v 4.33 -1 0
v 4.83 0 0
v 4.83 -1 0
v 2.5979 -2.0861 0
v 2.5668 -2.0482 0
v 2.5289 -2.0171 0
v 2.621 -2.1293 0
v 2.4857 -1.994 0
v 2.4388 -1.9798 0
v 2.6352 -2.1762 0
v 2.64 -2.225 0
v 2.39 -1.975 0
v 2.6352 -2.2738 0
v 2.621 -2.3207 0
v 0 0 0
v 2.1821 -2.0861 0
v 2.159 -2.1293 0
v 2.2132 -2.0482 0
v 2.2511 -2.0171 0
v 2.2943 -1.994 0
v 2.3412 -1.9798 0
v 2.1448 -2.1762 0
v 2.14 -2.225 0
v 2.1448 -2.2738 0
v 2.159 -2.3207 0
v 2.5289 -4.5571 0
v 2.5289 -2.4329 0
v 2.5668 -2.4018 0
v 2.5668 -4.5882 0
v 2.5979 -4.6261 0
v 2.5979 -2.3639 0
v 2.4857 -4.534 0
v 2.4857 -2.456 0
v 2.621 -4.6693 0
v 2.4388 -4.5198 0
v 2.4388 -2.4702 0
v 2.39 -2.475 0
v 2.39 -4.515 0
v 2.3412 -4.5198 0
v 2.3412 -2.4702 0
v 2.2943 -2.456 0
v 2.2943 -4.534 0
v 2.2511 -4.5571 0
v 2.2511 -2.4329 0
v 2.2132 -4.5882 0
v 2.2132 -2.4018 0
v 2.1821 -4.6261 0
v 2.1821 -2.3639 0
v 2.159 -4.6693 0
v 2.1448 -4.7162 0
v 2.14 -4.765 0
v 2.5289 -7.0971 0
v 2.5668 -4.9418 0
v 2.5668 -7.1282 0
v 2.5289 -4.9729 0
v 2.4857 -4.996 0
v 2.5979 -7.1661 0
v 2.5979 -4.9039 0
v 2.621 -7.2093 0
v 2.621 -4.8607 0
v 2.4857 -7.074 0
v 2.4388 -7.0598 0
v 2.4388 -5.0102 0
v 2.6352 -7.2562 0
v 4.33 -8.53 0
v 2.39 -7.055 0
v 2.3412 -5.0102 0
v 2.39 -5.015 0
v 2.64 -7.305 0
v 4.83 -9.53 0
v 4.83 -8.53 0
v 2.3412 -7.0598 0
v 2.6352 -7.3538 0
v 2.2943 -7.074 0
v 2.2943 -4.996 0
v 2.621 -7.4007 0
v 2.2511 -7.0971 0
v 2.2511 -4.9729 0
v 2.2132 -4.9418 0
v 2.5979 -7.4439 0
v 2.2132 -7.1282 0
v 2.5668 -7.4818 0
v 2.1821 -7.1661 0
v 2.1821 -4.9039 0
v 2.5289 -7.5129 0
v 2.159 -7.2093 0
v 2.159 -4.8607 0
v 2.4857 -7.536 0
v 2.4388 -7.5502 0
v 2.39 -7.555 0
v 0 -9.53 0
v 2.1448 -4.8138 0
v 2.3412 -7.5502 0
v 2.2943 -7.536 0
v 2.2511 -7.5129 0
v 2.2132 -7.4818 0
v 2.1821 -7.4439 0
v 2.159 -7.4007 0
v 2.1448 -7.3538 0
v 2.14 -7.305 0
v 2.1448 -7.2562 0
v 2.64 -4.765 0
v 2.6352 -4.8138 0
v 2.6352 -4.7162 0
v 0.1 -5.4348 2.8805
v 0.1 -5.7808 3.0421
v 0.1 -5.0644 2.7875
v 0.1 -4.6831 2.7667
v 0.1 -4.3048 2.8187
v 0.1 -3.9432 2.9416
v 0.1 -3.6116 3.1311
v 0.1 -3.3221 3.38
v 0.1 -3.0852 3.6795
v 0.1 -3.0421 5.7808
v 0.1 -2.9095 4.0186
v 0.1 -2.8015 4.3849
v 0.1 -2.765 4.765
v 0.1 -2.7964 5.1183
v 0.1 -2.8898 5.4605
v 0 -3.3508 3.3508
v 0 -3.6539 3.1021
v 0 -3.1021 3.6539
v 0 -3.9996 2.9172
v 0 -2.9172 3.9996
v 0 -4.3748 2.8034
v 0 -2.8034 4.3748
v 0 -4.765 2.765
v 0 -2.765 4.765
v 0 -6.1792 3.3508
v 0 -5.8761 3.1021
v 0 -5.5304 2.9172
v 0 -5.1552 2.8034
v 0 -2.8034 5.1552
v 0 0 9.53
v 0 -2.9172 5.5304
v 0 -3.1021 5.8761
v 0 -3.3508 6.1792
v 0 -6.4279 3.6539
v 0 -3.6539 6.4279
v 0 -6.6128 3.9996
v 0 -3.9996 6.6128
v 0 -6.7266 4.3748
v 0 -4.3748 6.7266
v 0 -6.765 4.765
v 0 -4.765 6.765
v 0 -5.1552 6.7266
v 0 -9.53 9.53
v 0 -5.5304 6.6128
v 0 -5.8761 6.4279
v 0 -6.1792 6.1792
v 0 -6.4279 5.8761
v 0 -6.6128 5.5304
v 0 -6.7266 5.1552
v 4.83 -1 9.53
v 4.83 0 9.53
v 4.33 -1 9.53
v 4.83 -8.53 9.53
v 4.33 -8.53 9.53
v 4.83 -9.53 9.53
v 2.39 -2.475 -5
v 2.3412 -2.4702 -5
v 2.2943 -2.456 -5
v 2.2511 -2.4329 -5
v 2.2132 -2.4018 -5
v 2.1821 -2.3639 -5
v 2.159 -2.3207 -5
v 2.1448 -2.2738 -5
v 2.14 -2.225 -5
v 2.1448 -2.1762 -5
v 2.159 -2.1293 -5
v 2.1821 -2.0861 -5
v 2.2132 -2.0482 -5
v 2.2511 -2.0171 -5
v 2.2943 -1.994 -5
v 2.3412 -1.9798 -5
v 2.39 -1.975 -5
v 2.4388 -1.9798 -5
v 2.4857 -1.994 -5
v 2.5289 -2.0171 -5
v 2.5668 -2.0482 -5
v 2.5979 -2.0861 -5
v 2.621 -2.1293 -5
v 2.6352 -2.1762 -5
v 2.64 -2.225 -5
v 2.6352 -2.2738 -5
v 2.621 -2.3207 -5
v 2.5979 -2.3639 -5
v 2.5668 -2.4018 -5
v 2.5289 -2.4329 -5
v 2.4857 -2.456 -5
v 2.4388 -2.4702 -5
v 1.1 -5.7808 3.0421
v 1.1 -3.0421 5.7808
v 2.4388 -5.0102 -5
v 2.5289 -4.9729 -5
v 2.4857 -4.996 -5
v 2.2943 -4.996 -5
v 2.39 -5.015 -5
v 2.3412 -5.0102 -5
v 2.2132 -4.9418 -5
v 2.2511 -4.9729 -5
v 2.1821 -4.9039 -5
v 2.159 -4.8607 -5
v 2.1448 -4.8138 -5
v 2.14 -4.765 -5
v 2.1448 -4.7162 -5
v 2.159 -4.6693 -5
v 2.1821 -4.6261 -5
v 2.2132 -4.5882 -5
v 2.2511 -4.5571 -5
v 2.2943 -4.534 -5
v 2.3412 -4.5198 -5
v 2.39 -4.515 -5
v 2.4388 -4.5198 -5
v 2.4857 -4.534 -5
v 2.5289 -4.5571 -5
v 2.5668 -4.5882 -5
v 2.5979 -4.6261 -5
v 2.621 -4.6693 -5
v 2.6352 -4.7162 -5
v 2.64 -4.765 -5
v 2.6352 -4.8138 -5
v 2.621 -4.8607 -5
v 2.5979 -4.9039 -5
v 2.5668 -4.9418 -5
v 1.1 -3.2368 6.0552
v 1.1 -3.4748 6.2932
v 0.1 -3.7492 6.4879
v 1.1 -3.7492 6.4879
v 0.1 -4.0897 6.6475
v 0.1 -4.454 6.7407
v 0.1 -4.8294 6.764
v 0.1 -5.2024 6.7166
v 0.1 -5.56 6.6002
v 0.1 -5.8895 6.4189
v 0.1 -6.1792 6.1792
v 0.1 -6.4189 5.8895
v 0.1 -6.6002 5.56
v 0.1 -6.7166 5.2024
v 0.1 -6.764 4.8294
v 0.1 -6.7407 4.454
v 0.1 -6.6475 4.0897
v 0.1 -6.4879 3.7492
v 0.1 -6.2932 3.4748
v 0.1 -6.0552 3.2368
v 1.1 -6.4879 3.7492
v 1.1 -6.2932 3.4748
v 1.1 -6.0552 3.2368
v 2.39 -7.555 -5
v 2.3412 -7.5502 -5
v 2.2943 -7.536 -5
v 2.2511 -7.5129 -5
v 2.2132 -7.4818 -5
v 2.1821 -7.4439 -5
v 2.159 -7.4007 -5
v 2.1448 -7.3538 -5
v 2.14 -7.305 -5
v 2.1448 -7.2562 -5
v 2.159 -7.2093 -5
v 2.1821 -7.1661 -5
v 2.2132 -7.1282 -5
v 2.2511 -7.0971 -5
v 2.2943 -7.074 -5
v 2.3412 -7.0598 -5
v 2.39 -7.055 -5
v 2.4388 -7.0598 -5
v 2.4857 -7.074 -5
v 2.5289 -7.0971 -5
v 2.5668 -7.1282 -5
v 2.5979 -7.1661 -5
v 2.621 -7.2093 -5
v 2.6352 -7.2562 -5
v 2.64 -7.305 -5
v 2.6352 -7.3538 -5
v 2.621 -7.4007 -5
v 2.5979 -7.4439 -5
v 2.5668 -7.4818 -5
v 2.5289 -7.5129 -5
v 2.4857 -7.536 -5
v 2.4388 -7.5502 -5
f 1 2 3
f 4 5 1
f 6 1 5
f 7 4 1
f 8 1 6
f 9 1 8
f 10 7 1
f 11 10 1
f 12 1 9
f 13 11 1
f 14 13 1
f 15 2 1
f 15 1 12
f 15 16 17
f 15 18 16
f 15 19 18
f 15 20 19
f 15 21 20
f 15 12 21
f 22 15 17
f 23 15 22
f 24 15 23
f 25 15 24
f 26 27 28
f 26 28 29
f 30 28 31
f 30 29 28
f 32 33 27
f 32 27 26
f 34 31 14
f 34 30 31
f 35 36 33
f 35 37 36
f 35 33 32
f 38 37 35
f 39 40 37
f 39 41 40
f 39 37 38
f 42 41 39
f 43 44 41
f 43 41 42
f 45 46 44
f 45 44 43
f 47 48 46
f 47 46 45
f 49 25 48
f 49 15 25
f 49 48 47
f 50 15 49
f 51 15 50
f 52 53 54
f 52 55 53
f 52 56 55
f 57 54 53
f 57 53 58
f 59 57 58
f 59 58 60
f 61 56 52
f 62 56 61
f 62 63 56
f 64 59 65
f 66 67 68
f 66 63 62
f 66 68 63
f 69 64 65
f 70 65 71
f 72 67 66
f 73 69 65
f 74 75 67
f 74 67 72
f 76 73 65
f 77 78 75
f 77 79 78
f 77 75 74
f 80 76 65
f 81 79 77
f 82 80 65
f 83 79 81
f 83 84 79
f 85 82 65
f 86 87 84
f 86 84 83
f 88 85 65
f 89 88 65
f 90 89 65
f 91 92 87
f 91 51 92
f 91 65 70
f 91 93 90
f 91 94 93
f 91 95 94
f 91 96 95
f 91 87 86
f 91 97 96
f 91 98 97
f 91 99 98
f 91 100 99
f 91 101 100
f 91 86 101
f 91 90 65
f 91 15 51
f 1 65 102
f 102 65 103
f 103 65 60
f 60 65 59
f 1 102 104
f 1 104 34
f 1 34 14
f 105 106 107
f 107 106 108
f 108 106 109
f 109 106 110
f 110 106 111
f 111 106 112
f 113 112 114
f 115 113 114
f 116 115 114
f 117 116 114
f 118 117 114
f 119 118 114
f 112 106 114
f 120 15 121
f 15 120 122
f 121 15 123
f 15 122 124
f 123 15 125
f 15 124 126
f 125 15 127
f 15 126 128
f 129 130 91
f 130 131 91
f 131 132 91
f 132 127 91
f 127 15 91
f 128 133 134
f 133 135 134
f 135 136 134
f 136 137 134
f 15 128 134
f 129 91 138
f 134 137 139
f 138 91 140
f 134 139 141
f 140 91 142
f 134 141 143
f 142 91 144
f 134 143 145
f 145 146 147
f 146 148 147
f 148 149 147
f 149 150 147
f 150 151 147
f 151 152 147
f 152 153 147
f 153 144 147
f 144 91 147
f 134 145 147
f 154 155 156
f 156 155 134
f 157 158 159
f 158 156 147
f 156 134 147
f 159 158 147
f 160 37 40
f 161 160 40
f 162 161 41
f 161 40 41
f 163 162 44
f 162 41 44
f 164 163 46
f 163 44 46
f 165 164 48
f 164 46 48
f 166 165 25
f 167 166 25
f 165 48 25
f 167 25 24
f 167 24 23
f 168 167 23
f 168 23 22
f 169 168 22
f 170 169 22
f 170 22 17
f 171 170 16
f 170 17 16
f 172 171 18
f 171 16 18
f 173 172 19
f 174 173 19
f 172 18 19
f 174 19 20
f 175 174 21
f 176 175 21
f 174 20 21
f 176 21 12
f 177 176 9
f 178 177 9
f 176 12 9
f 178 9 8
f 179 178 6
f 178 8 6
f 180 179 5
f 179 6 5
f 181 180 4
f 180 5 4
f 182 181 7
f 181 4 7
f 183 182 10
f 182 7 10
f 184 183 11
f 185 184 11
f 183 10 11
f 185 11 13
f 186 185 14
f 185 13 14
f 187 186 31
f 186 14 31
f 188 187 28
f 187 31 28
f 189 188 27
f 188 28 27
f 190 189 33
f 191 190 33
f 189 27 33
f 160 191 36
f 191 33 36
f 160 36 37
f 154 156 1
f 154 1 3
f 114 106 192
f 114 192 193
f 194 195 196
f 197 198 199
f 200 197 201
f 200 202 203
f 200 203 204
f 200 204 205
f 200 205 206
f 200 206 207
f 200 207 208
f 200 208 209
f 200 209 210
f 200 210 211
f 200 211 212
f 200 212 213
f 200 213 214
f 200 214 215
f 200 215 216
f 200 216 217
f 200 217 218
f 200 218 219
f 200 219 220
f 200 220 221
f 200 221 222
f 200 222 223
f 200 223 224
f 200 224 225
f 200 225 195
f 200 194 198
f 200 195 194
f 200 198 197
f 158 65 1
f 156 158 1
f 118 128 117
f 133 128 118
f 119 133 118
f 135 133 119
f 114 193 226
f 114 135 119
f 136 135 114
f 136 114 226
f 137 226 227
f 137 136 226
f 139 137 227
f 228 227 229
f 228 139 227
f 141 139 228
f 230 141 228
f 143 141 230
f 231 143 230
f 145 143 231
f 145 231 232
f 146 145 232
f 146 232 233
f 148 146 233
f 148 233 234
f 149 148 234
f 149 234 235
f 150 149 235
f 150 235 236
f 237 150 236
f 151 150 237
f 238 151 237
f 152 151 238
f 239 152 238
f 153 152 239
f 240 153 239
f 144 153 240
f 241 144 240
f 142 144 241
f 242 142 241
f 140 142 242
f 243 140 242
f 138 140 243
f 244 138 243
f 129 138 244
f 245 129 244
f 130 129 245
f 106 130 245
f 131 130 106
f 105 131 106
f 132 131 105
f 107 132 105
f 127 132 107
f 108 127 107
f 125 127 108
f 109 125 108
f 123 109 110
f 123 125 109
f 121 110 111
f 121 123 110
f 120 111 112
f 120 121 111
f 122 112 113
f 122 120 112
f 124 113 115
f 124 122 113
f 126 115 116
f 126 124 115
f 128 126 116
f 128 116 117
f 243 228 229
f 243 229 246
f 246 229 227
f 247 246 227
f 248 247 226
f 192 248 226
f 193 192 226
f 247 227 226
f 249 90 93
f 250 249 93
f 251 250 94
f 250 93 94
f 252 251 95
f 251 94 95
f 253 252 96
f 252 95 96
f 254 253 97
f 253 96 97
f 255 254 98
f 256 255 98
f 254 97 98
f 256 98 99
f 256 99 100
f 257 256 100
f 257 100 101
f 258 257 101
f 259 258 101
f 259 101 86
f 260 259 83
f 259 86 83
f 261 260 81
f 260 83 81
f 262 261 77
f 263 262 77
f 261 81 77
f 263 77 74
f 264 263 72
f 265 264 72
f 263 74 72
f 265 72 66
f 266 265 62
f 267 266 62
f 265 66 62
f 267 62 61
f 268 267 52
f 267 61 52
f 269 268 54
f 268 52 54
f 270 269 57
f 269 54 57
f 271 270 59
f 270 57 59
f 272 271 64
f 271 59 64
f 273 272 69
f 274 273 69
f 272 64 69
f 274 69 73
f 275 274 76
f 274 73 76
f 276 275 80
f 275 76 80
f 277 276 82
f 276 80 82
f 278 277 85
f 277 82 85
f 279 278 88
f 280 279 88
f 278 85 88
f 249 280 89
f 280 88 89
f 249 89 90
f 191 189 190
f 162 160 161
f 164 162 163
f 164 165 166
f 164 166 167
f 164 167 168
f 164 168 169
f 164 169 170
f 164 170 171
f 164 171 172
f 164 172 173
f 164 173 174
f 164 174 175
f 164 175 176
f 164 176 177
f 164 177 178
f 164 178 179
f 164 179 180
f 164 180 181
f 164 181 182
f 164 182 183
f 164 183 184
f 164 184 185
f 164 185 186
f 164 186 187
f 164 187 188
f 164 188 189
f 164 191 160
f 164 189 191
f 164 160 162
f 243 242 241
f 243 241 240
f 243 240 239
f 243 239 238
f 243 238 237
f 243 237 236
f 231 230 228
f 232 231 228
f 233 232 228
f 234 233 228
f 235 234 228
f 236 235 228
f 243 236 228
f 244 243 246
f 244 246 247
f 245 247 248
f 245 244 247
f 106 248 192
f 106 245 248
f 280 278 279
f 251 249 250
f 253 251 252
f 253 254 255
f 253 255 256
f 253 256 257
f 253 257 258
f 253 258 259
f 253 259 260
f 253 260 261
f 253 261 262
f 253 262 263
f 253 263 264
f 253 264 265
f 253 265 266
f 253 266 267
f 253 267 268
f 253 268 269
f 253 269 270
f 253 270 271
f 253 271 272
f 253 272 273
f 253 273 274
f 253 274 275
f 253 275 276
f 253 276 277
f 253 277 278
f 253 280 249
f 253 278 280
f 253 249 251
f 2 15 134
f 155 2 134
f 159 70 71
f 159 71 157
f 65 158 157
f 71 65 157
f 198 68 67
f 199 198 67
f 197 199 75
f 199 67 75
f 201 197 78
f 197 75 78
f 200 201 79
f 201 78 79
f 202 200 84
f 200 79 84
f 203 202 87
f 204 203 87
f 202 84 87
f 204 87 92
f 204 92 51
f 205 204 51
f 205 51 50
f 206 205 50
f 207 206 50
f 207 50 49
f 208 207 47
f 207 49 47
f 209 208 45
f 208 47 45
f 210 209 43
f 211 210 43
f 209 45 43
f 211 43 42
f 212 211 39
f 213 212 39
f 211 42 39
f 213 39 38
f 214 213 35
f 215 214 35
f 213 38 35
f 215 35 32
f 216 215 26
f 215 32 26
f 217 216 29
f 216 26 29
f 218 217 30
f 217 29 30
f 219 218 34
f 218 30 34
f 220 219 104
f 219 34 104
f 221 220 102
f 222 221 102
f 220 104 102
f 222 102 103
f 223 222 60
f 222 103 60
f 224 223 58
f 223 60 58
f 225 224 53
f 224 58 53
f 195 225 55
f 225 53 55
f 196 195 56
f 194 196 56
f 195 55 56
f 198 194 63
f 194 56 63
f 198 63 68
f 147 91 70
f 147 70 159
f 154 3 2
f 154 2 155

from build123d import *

# Parameters (mm, degrees)
SKETCH1_W           = 9.53
SKETCH1_H           = 9.53
BASIC_SHAPE_DEPTH   = 4.83
SKETCH3_R           = 2
ADJUSTER_DEPTH      = 0.1
ADJUSTER_SLOT_DEPTH = 1
SKETCH5_R           = 0.25
PINS_DEPTH          = 5
SKETCH6_W           = 0.5
SKETCH6_H           = 7.53
REAR_RELIEF_DEPTH   = 15.53


with BuildPart() as part:
    # Sketch1 → Basic Shape (new body)
    with BuildSketch(Plane(origin=(0, 0, 0), x_dir=(0, 0, 1), z_dir=(1, 0, 0))):
        with Locations((4.765, 4.765)):
            Rectangle(SKETCH1_W, SKETCH1_H)
    extrude(amount=BASIC_SHAPE_DEPTH)

    # Sketch3 → Adjuster (cut)
    with BuildSketch(Plane.YZ):
        with Locations((-4.765, 4.765)):
            Circle(SKETCH3_R)
    extrude(amount=ADJUSTER_DEPTH, mode=Mode.SUBTRACT)

    # Sketch4 → Adjuster Slot (cut)
    with BuildSketch(Plane(origin=(0.1, 0, 0), x_dir=(0, -1, 0), z_dir=(-1, 0, 0))):
        with BuildLine():
            Line((3.749246997, 6.487859784), (6.487859784, 3.749246997))
            ThreePointArc((6.487859784, 3.749246997), (6.179213562, 3.350786438), (5.780753003, 3.042140216))
            Line((5.780753003, 3.042140216), (3.042140216, 5.780753003))
            ThreePointArc((3.042140216, 5.780753003), (3.350786438, 6.179213562), (3.749246997, 6.487859784))
        make_face()
    extrude(amount=-ADJUSTER_SLOT_DEPTH, mode=Mode.SUBTRACT)

    # Sketch5 → Pins (add)
    with BuildSketch(Plane(origin=(0, -19.06, 0), x_dir=(0, -1, 0), z_dir=(0, 0, -1))):
        with Locations((-16.835, -2.39)):
            Circle(SKETCH5_R)
        with Locations((-14.295, -2.39)):
            Circle(SKETCH5_R)
        with Locations((-11.755, -2.39)):
            Circle(SKETCH5_R)
    extrude(amount=PINS_DEPTH)

    # Sketch6 → Rear Relief (cut, through all)
    with BuildSketch(Plane.XY.offset(9.53)):
        with Locations((4.58, -4.765)):
            Rectangle(SKETCH6_W, SKETCH6_H)
    extrude(amount=-REAR_RELIEF_DEPTH, mode=Mode.SUBTRACT)


solid = part.part
